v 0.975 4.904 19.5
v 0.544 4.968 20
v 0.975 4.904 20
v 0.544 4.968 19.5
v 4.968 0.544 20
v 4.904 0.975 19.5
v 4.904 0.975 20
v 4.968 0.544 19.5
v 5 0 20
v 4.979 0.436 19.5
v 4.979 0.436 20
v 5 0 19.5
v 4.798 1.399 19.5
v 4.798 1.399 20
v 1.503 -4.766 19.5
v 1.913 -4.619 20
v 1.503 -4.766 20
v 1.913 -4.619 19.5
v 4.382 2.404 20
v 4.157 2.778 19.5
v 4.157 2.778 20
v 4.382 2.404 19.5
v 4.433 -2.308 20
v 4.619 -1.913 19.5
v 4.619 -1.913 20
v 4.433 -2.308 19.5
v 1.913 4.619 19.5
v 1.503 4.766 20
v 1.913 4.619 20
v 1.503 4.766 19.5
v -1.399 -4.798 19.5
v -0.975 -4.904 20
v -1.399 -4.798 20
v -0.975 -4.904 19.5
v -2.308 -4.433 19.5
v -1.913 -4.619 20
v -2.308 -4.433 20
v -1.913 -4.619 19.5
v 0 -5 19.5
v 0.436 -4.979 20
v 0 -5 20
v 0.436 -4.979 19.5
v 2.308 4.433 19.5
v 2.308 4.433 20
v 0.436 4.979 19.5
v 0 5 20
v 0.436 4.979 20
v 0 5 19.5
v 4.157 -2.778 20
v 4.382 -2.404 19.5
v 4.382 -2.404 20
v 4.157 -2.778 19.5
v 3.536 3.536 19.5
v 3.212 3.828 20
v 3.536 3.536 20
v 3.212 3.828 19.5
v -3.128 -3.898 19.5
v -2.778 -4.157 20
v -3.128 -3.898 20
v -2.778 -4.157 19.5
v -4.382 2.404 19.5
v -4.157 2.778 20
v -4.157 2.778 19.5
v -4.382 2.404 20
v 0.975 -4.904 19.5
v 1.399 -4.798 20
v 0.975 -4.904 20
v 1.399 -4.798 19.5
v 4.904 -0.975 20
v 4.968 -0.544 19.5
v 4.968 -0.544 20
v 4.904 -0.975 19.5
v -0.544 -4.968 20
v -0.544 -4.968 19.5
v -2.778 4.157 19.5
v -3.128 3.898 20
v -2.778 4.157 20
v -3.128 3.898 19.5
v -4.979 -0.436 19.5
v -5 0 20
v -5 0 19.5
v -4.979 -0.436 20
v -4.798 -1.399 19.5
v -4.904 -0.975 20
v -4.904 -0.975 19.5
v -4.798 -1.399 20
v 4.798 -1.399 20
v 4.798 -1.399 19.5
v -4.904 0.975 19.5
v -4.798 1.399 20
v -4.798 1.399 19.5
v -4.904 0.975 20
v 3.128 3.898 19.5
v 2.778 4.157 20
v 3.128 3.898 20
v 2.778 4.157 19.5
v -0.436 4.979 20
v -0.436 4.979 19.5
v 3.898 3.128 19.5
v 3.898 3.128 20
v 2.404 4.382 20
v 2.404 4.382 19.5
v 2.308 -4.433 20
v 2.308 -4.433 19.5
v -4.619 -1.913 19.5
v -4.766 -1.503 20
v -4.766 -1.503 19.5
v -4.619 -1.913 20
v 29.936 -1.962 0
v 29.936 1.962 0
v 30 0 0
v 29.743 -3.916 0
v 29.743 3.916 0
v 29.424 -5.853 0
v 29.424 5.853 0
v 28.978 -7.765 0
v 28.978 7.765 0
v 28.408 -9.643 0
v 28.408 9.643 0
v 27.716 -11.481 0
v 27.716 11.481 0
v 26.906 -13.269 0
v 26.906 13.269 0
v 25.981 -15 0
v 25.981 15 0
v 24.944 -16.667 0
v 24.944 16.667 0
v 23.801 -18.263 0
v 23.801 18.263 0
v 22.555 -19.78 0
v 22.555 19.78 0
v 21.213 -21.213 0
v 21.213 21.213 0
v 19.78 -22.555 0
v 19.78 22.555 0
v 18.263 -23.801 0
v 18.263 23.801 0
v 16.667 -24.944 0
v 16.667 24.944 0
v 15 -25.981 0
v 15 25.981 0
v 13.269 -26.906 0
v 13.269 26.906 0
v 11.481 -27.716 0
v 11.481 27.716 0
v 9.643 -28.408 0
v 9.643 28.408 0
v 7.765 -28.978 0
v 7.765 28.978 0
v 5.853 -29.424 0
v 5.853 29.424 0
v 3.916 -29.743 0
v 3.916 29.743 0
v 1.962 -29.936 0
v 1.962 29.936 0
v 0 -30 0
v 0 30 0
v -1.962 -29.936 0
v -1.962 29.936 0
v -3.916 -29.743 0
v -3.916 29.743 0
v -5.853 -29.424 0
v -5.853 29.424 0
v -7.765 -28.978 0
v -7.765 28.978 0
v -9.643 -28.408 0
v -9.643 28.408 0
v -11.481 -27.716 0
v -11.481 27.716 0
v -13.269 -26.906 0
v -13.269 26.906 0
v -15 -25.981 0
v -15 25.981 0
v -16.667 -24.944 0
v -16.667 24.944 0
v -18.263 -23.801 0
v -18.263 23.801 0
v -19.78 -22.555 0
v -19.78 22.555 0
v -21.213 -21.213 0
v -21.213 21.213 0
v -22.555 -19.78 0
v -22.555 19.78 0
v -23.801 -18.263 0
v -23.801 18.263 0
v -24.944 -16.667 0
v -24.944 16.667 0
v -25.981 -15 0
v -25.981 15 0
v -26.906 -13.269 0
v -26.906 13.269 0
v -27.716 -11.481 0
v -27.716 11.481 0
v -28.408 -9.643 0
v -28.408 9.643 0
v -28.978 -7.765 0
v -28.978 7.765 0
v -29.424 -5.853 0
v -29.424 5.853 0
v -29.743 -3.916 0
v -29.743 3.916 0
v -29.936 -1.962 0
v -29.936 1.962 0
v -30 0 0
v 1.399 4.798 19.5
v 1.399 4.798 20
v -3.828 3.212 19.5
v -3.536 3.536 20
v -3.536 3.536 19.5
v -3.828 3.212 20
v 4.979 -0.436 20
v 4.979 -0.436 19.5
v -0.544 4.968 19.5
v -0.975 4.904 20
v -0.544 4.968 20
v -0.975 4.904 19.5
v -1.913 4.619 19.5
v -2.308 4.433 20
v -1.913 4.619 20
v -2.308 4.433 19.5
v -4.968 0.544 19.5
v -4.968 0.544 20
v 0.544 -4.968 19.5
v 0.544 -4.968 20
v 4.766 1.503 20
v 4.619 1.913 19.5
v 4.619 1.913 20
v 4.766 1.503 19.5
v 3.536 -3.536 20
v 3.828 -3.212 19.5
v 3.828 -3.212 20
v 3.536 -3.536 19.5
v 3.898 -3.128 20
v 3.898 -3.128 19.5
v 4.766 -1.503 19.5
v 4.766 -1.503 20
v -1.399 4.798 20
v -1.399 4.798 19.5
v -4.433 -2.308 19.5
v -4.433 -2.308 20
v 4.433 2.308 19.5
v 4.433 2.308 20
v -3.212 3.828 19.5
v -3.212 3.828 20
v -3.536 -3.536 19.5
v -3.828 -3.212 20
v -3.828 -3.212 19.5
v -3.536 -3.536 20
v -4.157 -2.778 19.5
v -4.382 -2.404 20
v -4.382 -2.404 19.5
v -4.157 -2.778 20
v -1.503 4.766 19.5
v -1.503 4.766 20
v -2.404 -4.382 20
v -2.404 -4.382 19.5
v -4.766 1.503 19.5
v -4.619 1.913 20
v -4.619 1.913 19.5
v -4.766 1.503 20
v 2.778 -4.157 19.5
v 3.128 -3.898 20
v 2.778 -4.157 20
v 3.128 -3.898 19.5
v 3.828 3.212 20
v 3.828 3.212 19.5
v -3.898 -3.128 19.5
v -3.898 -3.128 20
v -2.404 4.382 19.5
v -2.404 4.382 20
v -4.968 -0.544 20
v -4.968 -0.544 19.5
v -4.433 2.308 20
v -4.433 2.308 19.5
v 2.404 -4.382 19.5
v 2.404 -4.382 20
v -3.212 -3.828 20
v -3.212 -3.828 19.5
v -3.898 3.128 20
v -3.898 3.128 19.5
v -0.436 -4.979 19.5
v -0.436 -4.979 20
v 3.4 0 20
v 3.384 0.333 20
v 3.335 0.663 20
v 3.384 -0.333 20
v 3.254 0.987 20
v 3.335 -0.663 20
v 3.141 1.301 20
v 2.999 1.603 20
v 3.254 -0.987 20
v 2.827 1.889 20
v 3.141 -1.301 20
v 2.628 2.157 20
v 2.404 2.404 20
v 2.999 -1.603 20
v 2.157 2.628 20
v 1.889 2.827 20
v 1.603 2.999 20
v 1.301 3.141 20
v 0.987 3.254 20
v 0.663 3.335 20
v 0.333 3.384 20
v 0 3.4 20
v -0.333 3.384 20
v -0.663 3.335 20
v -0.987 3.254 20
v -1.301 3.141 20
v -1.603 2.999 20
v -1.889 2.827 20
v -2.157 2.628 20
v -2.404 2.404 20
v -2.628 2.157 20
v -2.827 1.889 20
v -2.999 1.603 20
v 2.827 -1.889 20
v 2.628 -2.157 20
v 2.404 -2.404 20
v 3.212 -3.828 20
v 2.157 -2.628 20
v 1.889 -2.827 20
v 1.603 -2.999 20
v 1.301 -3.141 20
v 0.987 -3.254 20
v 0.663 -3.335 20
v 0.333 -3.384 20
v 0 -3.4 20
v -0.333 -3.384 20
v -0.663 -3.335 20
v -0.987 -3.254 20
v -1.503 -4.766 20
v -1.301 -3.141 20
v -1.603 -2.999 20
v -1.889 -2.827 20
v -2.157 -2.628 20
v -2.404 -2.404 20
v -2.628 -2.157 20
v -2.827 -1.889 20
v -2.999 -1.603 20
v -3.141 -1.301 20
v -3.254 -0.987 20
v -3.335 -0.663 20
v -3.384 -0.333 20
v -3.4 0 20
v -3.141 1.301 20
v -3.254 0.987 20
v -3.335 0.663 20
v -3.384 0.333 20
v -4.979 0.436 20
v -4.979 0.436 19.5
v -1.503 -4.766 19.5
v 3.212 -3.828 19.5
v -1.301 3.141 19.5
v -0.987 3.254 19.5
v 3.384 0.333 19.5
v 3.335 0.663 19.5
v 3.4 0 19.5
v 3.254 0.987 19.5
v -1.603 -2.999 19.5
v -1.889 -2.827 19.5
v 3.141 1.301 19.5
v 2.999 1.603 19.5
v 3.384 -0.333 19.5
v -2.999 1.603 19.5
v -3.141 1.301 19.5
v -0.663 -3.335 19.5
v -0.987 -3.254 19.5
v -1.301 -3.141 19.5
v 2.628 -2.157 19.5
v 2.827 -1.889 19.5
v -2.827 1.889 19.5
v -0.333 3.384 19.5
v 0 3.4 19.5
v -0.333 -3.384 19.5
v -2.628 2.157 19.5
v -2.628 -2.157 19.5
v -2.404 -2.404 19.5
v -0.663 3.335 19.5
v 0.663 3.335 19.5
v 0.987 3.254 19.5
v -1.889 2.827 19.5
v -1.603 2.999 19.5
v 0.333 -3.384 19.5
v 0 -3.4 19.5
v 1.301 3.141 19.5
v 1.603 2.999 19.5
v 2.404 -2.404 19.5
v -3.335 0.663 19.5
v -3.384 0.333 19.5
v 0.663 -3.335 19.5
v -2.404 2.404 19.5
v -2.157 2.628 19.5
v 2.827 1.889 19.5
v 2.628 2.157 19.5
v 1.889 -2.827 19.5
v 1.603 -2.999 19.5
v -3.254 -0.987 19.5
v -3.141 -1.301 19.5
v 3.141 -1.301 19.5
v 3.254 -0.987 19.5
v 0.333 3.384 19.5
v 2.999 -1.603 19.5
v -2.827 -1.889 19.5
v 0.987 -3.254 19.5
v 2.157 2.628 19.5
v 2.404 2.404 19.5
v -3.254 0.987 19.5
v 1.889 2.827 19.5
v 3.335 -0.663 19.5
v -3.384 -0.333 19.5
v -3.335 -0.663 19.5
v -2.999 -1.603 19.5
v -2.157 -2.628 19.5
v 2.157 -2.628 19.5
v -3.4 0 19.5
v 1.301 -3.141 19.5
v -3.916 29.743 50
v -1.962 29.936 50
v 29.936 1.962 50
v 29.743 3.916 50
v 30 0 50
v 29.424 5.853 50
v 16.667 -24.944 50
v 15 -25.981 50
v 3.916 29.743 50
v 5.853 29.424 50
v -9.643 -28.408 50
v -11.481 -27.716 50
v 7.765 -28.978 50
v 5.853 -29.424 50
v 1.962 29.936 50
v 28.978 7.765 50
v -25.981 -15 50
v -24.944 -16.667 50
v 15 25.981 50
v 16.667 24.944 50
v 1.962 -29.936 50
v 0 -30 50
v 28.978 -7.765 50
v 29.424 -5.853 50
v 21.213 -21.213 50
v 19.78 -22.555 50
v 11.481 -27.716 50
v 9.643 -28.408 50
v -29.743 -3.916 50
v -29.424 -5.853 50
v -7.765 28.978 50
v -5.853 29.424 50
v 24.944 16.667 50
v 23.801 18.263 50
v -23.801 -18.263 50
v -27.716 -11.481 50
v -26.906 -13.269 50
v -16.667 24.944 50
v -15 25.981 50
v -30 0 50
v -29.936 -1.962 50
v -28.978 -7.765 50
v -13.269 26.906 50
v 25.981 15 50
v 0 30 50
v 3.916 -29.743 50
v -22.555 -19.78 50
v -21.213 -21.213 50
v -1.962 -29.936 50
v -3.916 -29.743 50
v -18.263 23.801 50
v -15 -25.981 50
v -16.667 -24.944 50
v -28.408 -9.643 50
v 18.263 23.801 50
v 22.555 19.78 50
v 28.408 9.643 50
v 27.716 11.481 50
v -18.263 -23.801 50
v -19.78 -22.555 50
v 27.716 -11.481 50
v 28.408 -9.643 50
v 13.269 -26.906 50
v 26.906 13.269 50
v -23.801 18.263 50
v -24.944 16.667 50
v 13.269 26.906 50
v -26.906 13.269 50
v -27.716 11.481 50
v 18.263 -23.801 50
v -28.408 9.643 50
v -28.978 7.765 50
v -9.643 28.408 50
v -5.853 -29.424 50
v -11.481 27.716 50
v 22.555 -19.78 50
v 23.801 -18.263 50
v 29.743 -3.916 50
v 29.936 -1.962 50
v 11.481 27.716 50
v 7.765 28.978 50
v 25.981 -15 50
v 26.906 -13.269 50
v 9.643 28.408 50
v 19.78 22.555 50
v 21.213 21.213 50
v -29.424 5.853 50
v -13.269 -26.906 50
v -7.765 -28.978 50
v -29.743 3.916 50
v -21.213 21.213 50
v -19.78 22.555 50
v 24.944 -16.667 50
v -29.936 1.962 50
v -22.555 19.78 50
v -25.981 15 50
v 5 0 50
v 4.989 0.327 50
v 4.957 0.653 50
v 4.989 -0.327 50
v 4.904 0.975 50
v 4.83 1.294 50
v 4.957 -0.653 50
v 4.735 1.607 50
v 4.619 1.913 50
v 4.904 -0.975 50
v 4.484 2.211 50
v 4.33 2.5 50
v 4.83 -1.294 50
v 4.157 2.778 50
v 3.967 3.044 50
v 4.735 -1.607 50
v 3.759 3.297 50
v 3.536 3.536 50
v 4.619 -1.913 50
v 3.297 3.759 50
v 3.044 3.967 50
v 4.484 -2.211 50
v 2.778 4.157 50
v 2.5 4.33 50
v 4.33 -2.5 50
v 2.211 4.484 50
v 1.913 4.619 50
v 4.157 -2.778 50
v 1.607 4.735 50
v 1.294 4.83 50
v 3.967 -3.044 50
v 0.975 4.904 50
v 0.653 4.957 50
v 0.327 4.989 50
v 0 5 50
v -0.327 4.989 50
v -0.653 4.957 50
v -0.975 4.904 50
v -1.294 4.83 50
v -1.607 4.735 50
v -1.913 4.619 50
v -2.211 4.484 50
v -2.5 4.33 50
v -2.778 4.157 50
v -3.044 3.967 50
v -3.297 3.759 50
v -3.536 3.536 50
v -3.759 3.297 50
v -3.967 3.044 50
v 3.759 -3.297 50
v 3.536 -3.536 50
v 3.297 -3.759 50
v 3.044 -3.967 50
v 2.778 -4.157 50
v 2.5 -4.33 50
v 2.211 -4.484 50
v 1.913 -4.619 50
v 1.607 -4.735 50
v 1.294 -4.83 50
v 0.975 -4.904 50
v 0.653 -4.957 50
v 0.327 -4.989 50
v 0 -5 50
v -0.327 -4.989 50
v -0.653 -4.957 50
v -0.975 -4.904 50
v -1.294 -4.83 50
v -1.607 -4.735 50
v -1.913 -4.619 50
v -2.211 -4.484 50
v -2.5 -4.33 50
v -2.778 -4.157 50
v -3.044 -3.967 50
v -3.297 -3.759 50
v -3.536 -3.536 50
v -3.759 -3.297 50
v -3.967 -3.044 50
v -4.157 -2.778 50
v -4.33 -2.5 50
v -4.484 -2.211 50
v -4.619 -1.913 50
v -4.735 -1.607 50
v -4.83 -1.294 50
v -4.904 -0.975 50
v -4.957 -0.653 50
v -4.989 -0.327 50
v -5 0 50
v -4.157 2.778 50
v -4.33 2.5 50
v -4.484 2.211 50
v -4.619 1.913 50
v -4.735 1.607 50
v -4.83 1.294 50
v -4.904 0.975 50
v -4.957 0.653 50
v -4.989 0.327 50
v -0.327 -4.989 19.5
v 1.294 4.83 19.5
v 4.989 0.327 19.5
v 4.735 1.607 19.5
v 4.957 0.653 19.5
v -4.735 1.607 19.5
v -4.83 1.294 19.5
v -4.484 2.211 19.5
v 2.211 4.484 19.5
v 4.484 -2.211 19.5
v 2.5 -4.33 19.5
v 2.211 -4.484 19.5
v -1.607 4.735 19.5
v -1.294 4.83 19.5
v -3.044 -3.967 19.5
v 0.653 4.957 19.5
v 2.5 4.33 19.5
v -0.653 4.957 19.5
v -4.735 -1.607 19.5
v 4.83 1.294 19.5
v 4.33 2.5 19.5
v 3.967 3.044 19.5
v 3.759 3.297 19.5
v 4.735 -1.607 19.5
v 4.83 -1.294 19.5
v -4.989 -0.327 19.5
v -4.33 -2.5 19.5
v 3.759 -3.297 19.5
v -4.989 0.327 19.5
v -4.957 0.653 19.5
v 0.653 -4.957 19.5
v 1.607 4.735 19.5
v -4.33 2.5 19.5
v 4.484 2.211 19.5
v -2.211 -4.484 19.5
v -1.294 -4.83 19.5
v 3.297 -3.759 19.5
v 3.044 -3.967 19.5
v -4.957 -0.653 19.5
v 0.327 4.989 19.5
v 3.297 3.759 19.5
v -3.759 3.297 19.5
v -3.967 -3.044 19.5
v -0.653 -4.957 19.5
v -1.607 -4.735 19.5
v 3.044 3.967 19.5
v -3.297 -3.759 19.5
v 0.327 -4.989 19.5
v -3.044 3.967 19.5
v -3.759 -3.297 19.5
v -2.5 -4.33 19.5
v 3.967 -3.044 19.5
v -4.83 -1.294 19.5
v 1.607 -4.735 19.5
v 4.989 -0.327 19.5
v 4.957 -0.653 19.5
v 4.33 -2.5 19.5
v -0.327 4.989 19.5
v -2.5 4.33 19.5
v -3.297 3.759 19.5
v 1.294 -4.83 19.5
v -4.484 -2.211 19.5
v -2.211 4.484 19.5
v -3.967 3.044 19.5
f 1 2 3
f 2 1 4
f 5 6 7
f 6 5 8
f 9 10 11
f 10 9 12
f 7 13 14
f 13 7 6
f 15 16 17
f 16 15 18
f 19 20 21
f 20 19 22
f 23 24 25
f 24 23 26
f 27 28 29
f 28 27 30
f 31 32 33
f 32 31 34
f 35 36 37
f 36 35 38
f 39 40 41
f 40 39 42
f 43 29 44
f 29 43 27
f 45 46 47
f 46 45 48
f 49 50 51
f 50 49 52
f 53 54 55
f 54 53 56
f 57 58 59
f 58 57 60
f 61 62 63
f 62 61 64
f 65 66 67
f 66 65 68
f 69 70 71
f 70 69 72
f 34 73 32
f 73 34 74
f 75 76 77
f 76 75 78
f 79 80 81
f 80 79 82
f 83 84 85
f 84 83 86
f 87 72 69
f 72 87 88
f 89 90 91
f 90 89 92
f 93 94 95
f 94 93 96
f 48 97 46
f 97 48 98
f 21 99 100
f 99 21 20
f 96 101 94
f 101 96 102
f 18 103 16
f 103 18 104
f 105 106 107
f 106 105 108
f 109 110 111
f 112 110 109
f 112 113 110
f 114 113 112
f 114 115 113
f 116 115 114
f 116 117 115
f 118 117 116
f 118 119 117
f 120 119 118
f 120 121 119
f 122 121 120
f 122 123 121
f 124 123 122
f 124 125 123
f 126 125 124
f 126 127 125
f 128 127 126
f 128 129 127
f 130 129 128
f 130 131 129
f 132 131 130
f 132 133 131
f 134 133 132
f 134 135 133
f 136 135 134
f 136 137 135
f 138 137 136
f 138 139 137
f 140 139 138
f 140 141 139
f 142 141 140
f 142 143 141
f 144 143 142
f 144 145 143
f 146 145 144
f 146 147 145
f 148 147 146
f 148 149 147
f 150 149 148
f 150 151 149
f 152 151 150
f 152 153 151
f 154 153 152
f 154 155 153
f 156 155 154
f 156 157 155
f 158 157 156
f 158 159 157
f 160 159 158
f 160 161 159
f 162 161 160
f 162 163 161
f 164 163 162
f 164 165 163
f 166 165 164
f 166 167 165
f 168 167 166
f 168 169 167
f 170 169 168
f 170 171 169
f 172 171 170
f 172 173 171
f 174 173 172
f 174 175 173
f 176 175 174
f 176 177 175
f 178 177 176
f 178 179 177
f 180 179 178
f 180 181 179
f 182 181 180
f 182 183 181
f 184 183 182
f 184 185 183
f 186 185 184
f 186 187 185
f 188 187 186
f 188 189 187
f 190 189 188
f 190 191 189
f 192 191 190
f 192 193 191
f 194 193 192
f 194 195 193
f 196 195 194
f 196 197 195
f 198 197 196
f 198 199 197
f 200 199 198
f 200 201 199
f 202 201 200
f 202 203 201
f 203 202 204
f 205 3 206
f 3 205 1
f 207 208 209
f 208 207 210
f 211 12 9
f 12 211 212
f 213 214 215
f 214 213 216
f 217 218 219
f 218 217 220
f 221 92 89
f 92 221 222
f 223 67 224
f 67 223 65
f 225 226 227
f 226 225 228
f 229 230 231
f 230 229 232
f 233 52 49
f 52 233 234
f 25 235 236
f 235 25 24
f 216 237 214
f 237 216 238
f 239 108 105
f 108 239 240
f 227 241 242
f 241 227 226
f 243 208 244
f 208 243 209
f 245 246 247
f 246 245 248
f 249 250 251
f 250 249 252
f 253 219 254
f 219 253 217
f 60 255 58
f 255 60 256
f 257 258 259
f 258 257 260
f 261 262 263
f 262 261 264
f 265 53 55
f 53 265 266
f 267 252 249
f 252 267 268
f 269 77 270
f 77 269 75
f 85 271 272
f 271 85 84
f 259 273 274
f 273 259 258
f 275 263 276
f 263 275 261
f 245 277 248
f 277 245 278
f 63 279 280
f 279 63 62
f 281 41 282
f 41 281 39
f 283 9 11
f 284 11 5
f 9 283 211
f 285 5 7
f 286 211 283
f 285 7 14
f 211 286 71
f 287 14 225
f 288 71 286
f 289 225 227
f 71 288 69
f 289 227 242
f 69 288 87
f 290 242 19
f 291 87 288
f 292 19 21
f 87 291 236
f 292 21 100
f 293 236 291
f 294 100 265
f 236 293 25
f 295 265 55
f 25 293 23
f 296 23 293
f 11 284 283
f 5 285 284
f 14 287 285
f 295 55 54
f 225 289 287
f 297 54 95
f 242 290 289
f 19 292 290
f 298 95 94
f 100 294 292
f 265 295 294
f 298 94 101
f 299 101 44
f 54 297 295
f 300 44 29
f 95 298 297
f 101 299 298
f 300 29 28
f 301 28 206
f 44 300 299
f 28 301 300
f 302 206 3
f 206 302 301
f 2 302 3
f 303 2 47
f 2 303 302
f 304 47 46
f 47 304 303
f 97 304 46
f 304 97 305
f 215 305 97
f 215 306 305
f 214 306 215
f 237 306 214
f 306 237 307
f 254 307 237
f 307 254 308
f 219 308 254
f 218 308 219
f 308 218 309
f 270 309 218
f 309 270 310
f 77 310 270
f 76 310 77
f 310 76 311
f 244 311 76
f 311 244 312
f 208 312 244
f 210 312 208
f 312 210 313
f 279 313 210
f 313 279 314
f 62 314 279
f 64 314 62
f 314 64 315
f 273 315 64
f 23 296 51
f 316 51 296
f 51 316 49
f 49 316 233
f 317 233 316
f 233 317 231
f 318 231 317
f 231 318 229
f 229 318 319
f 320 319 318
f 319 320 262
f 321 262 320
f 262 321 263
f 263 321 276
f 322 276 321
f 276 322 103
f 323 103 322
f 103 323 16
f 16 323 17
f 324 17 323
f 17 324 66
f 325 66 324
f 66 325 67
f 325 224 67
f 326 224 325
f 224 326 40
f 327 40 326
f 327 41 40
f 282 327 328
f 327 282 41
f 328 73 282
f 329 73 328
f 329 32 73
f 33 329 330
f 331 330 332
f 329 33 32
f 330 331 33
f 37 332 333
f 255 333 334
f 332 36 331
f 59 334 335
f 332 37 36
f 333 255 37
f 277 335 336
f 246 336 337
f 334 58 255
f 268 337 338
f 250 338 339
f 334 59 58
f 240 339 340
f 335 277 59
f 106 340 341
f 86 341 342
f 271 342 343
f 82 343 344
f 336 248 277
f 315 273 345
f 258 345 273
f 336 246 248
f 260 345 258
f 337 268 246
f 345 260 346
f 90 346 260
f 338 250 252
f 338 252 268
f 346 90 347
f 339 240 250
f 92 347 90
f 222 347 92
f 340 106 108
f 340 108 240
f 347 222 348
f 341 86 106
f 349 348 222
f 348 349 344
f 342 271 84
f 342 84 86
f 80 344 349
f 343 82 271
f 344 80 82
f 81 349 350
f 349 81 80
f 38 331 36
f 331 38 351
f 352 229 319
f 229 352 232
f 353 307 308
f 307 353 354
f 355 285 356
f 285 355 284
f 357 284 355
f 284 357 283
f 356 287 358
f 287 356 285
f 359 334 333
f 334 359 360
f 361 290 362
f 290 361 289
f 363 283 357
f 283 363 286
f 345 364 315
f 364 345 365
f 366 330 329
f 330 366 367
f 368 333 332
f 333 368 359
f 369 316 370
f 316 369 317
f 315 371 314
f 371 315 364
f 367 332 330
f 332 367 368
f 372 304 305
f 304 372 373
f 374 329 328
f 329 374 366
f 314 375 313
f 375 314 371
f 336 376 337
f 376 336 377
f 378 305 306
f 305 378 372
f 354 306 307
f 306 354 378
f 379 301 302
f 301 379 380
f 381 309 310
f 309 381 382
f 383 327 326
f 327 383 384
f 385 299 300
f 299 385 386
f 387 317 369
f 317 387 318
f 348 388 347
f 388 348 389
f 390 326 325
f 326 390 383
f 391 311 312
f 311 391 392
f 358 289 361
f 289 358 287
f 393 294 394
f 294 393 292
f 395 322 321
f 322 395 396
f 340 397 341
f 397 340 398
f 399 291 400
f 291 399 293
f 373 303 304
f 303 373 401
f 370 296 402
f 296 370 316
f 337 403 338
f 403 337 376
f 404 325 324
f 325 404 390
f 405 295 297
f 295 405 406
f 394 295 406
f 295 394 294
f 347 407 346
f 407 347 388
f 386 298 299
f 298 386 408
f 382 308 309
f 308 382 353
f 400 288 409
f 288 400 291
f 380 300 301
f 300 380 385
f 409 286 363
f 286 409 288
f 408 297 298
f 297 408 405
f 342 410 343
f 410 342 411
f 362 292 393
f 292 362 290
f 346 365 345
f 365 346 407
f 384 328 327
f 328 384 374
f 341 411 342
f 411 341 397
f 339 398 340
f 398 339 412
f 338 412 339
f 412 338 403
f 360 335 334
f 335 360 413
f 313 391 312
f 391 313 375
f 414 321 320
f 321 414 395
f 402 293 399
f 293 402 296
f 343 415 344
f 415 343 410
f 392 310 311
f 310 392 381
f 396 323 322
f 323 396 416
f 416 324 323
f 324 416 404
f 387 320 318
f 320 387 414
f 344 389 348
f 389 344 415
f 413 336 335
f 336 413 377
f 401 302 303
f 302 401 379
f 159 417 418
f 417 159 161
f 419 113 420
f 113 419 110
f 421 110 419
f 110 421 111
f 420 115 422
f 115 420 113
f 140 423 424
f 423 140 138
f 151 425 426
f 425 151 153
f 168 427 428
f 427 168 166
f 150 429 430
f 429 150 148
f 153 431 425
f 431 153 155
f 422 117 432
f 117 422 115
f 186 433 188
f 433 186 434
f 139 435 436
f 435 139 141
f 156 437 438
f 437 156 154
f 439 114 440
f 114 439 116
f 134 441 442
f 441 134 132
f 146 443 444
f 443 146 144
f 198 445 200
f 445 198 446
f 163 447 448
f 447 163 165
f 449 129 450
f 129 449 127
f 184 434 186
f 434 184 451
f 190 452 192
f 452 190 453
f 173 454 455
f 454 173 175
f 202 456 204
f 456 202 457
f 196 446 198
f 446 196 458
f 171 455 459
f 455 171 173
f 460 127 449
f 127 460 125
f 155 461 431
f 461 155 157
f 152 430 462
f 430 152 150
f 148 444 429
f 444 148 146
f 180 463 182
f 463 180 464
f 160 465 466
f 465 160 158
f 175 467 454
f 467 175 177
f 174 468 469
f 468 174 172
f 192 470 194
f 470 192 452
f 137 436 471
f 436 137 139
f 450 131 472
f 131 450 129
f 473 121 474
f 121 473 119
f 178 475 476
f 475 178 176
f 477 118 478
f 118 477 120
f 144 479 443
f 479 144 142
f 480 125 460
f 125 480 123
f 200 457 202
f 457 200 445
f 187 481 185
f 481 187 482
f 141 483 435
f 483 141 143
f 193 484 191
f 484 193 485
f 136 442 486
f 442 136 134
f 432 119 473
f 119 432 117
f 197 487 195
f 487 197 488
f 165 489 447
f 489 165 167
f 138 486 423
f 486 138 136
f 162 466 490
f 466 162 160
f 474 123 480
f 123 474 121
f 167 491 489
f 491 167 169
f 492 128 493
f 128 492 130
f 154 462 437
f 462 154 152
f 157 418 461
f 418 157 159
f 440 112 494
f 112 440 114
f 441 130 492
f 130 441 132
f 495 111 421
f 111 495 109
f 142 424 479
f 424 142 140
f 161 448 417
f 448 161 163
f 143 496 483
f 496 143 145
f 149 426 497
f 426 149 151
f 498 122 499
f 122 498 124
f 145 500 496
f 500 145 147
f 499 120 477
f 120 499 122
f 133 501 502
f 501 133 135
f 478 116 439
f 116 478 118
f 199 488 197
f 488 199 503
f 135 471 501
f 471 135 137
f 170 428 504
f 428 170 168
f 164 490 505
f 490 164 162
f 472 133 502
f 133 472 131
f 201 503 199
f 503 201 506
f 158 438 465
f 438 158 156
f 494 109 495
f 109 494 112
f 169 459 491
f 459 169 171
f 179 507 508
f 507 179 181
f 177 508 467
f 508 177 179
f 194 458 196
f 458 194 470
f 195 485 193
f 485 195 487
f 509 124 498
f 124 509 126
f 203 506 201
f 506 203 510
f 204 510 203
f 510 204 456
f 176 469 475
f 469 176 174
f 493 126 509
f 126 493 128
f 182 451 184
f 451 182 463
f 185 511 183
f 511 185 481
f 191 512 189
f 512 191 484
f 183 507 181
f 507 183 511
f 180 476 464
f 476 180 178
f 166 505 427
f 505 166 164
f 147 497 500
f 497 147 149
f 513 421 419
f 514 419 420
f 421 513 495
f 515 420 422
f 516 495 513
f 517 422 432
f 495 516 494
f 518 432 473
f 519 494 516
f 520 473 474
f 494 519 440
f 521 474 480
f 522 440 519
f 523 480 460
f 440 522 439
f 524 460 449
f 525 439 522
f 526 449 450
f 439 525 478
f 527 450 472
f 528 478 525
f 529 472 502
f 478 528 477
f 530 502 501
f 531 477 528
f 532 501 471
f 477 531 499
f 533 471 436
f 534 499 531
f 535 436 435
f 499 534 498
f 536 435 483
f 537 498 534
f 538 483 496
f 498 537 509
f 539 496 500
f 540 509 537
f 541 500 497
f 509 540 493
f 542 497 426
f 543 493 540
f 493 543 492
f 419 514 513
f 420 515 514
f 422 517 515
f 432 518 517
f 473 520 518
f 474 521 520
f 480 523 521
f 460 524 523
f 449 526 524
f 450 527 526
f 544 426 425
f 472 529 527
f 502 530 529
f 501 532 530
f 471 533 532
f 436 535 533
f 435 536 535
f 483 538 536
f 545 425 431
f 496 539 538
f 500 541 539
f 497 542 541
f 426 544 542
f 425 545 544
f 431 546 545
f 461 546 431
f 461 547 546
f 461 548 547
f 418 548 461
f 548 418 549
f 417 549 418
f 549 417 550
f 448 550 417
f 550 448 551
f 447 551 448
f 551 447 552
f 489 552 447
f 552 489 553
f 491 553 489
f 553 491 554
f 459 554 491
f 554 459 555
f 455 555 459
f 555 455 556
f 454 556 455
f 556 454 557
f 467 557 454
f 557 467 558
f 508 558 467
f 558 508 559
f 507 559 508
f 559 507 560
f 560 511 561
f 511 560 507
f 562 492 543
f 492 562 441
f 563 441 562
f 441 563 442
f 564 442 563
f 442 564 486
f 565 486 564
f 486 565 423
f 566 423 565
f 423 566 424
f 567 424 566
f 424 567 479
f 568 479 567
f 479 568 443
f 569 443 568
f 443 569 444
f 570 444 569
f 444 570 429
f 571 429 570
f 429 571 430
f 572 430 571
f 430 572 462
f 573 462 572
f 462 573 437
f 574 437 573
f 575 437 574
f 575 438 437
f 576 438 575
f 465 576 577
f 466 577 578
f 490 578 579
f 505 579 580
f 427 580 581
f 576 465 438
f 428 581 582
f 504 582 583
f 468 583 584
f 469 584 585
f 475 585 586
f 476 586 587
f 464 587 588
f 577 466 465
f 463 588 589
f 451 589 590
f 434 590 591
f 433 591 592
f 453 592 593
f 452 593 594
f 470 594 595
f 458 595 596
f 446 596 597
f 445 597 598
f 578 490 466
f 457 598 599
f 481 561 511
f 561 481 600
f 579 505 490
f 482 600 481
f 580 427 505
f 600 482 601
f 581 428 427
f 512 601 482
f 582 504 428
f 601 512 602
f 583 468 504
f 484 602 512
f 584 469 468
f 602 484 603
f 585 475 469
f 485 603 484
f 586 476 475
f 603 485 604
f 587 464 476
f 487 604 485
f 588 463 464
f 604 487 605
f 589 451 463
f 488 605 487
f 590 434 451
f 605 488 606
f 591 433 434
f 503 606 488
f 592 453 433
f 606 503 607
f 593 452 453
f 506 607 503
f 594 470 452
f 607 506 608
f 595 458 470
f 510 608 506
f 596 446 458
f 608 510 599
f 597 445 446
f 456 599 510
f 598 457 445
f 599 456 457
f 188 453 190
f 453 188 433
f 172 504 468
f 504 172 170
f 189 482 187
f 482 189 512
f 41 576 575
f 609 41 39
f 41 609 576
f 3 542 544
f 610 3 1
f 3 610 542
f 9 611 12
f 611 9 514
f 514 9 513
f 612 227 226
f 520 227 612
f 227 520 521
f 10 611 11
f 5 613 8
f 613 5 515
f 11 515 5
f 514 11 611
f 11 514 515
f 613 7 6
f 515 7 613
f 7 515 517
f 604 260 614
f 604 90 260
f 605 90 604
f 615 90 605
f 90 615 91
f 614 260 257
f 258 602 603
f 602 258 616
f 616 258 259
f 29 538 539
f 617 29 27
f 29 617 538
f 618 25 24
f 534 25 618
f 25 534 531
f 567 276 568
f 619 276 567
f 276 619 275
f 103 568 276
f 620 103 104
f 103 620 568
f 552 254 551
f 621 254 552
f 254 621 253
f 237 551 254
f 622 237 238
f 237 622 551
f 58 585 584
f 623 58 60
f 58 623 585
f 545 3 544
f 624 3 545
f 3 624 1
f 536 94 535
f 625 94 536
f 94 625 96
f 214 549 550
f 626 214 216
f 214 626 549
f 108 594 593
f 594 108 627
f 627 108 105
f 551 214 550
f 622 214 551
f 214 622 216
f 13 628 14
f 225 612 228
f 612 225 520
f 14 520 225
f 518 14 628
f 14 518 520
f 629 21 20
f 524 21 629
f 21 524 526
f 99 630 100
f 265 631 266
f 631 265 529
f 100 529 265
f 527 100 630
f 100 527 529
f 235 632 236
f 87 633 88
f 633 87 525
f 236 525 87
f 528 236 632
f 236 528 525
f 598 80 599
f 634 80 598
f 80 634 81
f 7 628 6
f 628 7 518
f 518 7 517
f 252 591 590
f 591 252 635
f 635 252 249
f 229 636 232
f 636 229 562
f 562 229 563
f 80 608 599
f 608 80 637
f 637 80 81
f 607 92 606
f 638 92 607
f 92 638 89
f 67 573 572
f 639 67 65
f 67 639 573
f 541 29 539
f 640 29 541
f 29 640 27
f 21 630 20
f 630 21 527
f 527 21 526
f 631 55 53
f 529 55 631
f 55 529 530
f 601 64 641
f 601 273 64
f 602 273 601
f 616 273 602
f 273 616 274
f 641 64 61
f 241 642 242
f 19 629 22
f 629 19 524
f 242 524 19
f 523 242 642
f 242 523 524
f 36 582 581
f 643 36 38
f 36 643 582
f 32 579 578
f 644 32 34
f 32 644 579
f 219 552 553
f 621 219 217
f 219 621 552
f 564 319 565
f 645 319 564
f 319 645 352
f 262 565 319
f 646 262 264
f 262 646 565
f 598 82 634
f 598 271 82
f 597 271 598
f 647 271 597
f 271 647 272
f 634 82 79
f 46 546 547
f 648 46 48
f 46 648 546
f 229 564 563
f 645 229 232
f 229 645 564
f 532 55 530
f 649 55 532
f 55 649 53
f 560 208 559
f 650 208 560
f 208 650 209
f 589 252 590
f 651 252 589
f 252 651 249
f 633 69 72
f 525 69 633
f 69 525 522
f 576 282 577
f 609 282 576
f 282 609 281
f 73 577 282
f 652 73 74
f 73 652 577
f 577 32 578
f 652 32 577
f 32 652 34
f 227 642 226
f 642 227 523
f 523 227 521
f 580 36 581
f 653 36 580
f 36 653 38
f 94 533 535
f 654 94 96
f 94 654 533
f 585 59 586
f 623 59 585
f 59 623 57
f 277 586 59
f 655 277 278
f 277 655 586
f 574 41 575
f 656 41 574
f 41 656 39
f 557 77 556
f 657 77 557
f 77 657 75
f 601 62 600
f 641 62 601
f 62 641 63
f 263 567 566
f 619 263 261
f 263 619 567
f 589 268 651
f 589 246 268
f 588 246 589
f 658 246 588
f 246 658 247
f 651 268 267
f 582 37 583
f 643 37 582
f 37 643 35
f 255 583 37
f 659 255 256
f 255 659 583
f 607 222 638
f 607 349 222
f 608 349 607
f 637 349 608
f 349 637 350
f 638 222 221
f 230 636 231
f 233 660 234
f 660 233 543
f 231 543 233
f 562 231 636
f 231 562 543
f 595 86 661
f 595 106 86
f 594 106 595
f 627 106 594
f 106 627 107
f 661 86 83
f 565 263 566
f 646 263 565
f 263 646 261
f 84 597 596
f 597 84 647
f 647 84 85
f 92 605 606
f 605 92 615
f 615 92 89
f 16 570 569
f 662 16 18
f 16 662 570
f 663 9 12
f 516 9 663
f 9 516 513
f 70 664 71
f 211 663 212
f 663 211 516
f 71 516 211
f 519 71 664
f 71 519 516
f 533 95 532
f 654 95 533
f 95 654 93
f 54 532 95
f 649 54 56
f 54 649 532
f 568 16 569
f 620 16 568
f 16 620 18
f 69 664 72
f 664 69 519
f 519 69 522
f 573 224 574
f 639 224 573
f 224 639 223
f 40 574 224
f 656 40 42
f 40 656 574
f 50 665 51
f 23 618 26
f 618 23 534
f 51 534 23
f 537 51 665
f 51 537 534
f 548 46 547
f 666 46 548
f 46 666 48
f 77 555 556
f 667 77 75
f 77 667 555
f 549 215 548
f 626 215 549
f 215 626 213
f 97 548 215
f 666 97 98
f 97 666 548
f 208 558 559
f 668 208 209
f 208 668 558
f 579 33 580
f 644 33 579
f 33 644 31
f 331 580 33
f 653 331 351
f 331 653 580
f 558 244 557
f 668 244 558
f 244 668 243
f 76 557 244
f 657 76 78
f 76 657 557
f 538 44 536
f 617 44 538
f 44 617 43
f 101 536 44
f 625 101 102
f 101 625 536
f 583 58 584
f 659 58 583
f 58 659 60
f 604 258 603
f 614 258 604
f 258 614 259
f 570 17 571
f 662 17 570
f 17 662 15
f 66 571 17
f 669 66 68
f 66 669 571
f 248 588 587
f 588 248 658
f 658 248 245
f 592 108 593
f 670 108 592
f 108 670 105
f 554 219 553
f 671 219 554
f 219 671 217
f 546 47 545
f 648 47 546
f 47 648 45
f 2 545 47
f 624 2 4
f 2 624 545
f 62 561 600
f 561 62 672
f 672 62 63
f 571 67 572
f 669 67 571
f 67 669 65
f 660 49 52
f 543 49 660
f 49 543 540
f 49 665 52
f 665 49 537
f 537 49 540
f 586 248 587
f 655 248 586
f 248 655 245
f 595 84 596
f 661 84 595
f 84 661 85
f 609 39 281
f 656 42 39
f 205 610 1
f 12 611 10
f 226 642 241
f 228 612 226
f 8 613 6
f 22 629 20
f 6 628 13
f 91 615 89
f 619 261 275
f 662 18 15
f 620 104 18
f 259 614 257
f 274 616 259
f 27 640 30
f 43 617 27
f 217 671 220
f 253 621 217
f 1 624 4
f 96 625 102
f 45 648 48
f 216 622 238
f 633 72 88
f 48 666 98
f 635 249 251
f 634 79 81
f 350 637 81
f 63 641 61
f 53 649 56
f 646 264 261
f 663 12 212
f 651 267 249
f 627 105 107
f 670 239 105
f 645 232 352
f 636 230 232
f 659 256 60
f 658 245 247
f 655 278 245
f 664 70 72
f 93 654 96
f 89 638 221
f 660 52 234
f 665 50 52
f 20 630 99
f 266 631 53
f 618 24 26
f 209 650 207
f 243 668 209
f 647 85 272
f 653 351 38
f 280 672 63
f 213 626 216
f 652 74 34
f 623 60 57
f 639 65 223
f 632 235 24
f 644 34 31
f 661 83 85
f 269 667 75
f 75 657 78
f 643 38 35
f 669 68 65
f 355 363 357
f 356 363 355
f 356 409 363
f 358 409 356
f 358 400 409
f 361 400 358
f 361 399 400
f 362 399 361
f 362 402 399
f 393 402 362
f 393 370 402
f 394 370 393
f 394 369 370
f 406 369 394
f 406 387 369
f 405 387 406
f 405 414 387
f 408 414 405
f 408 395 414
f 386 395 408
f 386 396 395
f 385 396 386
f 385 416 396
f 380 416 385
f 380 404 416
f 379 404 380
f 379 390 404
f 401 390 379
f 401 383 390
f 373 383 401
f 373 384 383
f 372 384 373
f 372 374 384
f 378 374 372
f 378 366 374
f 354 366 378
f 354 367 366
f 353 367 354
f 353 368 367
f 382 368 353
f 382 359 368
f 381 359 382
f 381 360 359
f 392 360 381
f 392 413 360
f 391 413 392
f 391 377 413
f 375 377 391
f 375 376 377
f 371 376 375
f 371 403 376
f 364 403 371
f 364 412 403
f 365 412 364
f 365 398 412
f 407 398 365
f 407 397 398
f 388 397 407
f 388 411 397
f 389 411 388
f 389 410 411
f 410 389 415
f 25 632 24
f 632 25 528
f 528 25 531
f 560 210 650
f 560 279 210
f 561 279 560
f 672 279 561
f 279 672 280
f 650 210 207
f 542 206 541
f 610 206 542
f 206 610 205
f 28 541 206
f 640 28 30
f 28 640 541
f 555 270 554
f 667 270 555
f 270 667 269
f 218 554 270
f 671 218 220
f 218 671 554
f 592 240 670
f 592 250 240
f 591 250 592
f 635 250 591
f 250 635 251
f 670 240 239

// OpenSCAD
// Funnel with spout - printed upright, wide opening at the top
// Units: mm. Wall thickness 1.6 mm throughout.

// ---------- Parameters ----------
spout_d        = 10;    // spout outer diameter
spout_bore     = spout_d - 2 * 1.6;  // spout bore (6.8 mm)
spout_h        = 20;    // spout height (z = 0 to 20)
cone_top_d     = 10;    // cone outer diameter at z = 20 (top of spout)
cone_rim_d     = 60;    // cone outer diameter at rim (z = 50)
cone_h         = cone_rim_d - cone_top_d;  // cone height (40 mm)
eps            = 0.5;   // cutter overshoot past faces

$fn = 64;

// ---------- Model ----------
union() {
    // Spout: tube from z = 0 to 20, open at both ends
    difference() {
        cylinder(d = spout_d, h = spout_h);
        translate([0, 0, -eps])
            cylinder(d = spout_bore, h = spout_h + 2 * eps);
    }

    // Cone: widens from 10 mm at z = 20 to 60 mm at z = 50, open top and bottom
    difference() {
        cylinder(d = cone_rim_d, h = cone_h, $fn = 96);
        translate([0, 0, spout_h - eps])
            cylinder(d = cone_top_d, h = cone_h + eps, $fn = 96);
    }
}
